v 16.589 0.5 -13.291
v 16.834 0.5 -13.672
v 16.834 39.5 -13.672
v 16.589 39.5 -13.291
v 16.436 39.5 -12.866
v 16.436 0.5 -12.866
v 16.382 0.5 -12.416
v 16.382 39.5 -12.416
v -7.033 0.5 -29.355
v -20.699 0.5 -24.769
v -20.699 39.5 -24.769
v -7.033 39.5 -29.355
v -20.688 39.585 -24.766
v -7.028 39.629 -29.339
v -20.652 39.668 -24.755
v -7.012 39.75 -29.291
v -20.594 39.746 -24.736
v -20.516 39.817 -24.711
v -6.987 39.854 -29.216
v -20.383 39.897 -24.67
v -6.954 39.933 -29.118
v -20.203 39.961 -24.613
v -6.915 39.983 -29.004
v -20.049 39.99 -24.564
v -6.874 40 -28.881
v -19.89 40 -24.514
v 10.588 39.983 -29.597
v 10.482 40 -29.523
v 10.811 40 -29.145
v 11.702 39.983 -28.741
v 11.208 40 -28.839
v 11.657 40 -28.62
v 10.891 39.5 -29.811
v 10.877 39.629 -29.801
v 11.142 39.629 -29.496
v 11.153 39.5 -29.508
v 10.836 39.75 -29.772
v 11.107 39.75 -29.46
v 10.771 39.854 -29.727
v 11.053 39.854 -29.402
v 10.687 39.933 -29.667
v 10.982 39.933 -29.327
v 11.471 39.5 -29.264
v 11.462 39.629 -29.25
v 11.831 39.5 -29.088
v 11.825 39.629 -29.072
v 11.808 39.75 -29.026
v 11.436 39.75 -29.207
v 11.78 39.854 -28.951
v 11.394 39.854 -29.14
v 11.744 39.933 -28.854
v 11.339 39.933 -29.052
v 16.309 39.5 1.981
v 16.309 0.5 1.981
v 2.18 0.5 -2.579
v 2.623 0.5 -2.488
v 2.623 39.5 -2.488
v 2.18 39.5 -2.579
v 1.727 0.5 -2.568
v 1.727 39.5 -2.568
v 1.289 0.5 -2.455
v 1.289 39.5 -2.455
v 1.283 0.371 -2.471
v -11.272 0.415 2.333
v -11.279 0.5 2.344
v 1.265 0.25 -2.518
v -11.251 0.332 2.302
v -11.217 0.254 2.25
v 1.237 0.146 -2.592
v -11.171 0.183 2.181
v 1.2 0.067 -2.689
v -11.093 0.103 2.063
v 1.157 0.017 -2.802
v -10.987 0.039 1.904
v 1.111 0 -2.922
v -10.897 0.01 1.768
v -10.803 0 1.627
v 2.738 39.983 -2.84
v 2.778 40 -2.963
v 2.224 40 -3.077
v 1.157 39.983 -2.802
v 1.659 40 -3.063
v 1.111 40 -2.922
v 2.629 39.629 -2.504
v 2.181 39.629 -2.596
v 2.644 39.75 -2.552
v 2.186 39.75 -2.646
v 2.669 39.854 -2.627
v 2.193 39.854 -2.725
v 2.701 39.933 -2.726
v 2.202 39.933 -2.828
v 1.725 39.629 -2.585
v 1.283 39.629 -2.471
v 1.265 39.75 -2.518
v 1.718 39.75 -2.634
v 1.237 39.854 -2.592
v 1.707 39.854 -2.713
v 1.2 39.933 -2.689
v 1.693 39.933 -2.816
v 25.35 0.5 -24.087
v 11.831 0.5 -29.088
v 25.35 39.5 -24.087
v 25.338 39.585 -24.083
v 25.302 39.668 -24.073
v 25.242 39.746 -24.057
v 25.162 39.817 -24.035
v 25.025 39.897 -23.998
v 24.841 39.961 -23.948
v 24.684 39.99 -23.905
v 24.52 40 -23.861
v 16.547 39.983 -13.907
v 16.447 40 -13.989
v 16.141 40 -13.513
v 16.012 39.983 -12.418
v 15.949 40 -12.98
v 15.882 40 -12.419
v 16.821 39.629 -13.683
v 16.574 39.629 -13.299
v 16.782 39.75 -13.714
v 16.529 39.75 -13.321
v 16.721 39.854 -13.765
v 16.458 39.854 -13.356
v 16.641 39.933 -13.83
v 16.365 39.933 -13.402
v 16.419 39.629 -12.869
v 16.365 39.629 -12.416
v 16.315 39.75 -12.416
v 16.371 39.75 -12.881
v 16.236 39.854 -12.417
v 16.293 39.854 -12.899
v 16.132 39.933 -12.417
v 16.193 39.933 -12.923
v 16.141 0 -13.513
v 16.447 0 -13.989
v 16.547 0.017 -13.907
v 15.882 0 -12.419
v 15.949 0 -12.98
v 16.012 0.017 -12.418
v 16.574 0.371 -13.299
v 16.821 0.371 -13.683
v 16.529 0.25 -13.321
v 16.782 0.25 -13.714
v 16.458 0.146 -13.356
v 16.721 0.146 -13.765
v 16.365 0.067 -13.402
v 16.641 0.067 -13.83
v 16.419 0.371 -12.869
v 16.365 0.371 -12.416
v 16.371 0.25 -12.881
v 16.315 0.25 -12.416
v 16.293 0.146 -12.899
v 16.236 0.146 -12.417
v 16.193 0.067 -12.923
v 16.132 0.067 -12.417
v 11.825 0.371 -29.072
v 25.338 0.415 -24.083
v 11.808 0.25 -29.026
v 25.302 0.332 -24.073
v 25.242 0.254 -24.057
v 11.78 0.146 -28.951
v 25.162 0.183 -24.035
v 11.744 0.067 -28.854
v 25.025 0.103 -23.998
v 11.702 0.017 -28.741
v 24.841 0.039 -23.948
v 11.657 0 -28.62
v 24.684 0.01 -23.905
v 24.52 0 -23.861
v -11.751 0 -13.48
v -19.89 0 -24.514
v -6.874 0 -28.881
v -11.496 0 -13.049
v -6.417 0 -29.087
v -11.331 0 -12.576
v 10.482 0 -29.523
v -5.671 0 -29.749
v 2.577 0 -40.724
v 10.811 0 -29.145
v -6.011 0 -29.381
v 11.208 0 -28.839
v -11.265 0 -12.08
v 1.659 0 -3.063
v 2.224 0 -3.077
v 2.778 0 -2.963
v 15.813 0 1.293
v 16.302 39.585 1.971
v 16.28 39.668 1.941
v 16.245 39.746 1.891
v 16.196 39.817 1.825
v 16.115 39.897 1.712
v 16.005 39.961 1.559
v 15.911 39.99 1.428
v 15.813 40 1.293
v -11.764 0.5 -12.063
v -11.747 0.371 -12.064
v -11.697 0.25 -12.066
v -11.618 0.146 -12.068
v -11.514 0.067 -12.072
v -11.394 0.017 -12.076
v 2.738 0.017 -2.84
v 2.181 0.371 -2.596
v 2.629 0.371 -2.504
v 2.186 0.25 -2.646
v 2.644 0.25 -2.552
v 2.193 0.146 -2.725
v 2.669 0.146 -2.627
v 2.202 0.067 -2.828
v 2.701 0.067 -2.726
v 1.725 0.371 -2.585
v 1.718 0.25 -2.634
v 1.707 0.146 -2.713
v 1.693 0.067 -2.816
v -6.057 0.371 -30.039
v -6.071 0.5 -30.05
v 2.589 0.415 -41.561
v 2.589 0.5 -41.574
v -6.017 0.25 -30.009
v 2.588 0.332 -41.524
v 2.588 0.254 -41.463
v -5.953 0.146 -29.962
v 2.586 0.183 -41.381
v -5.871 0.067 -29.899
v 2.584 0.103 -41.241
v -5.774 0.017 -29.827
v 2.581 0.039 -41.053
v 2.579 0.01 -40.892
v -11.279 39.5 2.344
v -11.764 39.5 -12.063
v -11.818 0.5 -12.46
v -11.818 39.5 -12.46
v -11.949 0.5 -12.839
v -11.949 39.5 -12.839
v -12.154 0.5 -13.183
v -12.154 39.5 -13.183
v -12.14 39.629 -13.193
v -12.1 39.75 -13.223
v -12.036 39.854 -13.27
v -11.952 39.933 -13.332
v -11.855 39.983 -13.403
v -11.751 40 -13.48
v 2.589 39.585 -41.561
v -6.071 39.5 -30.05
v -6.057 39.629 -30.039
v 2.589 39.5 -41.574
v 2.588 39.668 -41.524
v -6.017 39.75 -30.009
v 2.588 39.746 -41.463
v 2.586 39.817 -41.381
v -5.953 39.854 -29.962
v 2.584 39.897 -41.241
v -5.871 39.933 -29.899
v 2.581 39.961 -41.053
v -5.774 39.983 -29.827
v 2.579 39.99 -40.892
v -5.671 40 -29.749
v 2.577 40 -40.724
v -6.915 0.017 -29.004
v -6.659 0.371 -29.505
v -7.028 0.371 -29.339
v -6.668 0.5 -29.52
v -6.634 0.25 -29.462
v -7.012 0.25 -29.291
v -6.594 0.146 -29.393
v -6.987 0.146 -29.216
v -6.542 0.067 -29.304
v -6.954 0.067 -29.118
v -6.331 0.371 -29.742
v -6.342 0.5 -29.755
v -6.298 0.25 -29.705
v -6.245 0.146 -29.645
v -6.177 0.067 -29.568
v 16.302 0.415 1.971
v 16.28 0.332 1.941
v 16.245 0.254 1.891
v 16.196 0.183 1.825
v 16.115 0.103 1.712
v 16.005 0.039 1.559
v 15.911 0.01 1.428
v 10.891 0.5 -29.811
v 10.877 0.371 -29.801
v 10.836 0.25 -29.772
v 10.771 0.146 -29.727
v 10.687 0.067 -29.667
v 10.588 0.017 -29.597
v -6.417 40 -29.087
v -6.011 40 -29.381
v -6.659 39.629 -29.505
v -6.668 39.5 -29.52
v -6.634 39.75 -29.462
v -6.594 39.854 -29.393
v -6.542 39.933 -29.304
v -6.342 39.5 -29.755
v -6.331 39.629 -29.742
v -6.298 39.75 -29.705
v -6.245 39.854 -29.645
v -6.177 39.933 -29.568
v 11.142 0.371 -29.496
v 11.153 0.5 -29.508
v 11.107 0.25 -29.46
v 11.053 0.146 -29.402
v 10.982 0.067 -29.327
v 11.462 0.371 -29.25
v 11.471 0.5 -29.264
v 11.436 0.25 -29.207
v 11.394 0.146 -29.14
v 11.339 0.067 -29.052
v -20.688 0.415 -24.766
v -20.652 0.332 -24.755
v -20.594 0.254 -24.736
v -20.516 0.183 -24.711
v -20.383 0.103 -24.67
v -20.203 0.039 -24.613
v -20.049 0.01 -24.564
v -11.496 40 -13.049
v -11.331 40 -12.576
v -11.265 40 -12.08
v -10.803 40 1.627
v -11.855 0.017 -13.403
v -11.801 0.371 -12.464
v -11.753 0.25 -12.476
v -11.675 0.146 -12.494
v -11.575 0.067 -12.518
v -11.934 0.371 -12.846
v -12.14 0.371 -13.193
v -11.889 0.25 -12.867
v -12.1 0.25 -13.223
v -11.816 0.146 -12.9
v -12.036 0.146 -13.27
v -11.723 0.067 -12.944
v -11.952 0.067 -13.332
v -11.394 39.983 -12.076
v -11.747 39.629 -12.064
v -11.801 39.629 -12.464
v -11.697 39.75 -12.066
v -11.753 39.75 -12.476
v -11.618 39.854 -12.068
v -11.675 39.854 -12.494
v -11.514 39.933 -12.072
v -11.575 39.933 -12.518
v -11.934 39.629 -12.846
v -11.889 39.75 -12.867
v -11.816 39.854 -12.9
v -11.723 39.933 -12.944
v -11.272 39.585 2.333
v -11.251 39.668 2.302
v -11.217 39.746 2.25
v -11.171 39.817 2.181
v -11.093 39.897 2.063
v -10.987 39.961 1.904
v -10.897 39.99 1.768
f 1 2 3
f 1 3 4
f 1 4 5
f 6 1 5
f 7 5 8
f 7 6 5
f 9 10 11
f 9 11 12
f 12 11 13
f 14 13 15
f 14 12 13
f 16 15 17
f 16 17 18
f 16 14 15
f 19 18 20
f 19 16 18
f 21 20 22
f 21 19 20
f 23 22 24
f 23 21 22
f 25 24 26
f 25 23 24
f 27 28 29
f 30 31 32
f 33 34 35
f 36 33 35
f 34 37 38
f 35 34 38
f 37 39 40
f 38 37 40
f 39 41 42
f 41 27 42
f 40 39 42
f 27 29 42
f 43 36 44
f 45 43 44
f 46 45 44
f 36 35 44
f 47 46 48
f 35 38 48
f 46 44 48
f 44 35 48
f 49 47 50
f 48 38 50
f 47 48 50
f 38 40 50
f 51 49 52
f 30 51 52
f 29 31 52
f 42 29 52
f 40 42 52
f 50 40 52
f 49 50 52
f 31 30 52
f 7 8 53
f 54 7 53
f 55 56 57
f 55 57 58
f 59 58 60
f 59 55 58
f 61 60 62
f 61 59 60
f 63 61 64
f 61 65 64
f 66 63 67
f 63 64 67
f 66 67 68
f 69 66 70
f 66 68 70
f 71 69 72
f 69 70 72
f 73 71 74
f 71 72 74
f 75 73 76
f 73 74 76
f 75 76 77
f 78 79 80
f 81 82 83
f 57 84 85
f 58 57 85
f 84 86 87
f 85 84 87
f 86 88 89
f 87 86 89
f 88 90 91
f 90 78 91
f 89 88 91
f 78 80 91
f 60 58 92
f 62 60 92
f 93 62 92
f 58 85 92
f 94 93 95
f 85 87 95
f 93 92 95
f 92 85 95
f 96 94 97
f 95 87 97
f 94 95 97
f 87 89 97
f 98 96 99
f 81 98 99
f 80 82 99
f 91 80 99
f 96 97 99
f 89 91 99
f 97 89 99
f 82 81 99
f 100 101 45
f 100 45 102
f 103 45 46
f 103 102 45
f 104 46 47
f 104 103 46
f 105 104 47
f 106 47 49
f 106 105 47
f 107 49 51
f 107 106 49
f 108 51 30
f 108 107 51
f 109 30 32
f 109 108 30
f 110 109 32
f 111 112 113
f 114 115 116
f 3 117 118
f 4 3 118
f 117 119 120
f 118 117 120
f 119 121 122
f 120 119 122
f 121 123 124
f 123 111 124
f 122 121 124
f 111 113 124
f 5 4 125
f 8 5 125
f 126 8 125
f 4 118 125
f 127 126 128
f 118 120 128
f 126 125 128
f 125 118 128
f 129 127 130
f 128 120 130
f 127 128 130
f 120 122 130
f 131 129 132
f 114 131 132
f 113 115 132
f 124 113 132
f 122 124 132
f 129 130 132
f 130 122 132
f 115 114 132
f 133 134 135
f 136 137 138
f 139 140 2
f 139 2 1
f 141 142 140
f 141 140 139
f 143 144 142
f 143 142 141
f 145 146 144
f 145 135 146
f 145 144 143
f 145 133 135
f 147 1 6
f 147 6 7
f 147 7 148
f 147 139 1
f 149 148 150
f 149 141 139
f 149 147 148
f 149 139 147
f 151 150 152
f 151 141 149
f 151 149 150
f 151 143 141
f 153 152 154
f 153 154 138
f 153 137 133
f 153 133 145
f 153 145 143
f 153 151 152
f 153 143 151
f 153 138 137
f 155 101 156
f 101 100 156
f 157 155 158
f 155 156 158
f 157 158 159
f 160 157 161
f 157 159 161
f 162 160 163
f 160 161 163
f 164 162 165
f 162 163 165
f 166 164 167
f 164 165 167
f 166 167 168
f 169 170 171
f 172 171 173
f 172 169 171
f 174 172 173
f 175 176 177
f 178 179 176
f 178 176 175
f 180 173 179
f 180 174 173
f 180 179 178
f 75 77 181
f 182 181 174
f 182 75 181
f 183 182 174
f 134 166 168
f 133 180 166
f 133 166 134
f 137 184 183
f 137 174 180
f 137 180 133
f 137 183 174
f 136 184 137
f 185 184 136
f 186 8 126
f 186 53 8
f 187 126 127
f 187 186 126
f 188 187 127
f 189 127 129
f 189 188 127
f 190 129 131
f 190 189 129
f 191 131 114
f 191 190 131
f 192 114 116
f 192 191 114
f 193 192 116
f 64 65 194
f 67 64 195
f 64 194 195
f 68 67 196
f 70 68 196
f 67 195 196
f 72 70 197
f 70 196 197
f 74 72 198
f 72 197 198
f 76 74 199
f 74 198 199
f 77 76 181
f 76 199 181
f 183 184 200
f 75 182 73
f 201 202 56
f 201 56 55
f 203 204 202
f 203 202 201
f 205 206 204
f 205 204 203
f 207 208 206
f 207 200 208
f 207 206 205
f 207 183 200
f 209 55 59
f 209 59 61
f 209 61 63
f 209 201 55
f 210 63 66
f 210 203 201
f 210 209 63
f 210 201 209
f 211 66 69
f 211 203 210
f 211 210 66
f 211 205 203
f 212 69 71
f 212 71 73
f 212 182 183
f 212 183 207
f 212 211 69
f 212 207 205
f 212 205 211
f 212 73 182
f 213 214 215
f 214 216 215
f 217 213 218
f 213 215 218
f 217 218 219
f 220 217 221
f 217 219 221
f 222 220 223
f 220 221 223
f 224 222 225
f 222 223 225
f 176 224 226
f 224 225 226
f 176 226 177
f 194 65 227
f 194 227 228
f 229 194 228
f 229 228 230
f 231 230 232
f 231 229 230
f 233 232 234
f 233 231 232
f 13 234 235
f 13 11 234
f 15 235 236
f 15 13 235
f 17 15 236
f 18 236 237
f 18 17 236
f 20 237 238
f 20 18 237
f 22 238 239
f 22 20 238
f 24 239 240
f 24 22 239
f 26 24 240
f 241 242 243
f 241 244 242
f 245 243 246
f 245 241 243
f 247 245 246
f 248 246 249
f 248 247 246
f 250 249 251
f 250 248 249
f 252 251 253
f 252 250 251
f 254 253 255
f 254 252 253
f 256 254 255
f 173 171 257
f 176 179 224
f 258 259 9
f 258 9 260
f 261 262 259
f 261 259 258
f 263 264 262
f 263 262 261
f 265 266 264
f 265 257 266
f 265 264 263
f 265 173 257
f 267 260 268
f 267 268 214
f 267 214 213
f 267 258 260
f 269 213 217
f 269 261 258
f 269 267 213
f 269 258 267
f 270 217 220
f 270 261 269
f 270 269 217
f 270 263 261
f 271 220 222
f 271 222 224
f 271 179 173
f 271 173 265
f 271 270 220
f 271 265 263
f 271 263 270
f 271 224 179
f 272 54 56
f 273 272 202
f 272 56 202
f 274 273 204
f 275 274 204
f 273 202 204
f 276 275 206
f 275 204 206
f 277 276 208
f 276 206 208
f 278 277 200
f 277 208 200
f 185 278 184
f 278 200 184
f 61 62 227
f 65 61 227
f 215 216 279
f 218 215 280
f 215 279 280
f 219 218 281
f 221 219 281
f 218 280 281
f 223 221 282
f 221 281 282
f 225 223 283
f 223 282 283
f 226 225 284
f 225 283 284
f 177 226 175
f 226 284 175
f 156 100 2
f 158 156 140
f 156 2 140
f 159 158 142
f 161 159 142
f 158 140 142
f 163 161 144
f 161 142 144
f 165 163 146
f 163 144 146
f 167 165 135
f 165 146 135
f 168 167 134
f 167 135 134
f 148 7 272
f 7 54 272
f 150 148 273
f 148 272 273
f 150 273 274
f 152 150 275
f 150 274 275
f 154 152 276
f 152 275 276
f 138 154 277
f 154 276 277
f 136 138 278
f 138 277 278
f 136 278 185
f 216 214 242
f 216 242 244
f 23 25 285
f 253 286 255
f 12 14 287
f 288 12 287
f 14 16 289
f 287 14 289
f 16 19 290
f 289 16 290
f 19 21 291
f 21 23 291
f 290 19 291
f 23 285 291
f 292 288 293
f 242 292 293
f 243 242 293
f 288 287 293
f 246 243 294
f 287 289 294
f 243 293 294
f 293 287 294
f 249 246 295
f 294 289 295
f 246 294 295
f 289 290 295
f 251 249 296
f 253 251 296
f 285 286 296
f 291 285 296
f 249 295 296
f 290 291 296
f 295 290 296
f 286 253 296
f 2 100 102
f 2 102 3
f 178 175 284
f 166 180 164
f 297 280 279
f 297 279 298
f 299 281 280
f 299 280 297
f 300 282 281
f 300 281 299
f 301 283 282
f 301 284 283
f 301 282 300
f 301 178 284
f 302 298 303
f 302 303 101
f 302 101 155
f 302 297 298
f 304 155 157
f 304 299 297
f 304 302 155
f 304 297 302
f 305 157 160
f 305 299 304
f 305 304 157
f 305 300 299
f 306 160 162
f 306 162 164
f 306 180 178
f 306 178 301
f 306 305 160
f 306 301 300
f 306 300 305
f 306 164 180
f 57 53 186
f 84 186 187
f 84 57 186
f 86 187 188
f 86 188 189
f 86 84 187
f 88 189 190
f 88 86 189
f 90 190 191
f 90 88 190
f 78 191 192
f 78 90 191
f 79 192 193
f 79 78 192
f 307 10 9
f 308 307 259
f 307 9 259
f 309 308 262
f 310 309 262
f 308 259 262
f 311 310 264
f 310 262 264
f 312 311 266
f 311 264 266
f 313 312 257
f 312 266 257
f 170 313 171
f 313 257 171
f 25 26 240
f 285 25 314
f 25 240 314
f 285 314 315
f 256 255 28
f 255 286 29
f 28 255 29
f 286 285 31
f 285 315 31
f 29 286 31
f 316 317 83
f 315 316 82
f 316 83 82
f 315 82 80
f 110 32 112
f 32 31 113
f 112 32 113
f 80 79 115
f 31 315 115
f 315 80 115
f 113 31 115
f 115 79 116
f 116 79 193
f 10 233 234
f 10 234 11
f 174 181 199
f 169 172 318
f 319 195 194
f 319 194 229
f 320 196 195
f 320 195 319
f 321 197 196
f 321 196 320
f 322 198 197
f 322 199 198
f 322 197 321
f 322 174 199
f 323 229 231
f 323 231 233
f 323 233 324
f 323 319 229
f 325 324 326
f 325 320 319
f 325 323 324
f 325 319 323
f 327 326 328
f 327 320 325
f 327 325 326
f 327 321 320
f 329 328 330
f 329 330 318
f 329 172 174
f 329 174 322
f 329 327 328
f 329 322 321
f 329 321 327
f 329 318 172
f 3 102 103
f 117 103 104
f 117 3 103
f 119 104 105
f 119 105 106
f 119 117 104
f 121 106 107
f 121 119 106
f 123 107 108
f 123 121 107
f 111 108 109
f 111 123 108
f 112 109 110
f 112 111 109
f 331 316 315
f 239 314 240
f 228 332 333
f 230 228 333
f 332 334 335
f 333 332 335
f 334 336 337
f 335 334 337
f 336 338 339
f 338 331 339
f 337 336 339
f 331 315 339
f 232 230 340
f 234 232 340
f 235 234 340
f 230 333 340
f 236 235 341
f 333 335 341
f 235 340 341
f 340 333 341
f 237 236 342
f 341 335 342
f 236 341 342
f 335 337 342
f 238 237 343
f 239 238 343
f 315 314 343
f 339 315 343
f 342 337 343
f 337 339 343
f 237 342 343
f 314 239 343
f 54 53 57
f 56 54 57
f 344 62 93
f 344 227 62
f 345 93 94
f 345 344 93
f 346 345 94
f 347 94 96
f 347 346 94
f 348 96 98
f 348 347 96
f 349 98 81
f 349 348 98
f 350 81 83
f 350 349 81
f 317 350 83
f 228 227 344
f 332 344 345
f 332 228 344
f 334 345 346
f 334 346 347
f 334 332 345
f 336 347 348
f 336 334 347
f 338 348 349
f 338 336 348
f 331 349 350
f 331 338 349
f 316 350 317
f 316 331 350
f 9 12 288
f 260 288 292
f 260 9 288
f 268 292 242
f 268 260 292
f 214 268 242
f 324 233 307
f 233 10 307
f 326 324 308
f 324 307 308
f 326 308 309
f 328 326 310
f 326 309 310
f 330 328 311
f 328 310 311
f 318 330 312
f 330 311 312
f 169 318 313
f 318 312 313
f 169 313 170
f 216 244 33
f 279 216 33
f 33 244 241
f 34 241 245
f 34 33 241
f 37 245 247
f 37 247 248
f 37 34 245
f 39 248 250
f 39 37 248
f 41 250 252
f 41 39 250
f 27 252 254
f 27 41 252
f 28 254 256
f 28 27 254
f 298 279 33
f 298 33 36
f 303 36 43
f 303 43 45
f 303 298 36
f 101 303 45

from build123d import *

# Parameters (mm, degrees)
BOSS_EXTRUDE1_DEPTH = 40
FILLET1_R           = 0.5


with BuildPart() as part:
    # Sketch1 → Boss-Extrude1 (new body)
    with BuildSketch(Plane(origin=(0, 0, 0), x_dir=(-1, 0, 0), z_dir=(0, 1, 0))):
        with BuildLine():
            Line((-16.382358243, -12.416132382), (-16.309116245, 1.980717277))
            Line((-16.309116245, 1.980717277), (-2.623220974, -2.488165706))
            ThreePointArc((-2.623220974, -2.488165706), (-1.953288331, -2.586352132), (-1.288986221, -2.455382561))
            Line((-1.288986221, -2.455382561), (11.279166812, 2.343564434))
            Line((11.279166812, 2.343564434), (11.764255017, -12.063312843))
            ThreePointArc((11.764255017, -12.063312843), (11.874027832, -12.652761031), (12.15358265, -13.183183826))
            Line((12.15358265, -13.183183826), (20.699476347, -24.769483728))
            Line((20.699476347, -24.769483728), (7.033191834, -29.354905309))
            ThreePointArc((7.033191834, -29.354905309), (6.499122182, -29.629147424), (6.070505236, -30.049536105))
            Line((6.070505236, -30.049536105), (-2.58921338, -41.573541353))
            Line((-2.58921338, -41.573541353), (-10.890805488, -29.810964554))
            ThreePointArc((-10.890805488, -29.810964554), (-11.306058502, -29.378455396), (-11.830848647, -29.088464807))
            Line((-11.830848647, -29.088464807), (-25.350255054, -24.086557786))
            Line((-25.350255054, -24.086557786), (-16.834067363, -13.67200498))
            ThreePointArc((-16.834067363, -13.67200498), (-16.500364189, -13.082859401), (-16.382358243, -12.416132382))
        make_face()
    extrude(amount=BOSS_EXTRUDE1_DEPTH)

    # Fillet1
    fillet1_edges = [part.edges().sort_by_distance(p)[0] for p in [
        (18.59055185, 40, -26.587511297),
        (16.345737244, 0, -5.217707553),
        (9.46616861, 0, -0.253724215),
        (1.953288331, 0, -2.586352132),
        (-4.995090296, 0, -0.055909063),
        (-11.521710915, 0, -4.859874204),
        (-11.874027832, 0, -12.652761031),
        (11.306058502, 40, -29.378455396),
        (-16.426529498, 0, -18.976333777),
        (-13.86633409, 0, -27.062194519),
        (-6.499122182, 0, -29.629147424),
        (-1.740645928, 0, -35.811538729),
        (6.740009434, 0, -35.692252953),
        (11.306058502, 0, -29.378455396),
        (18.59055185, 0, -26.587511297),
        (21.092161209, 0, -18.879281383),
        (16.500364189, 0, -13.082859401),
        (6.740009434, 40, -35.692252953),
        (-1.740645928, 40, -35.811538729),
        (-6.499122182, 40, -29.629147424),
        (-13.86633409, 40, -27.062194519),
        (-16.426529498, 40, -18.976333777),
        (-11.874027832, 40, -12.652761031),
        (-11.521710915, 40, -4.859874204),
        (-4.995090296, 40, -0.055909063),
        (16.500364189, 40, -13.082859401),
        (1.953288331, 40, -2.586352132),
        (9.46616861, 40, -0.253724215),
        (16.345737244, 40, -5.217707553),
        (21.092161209, 40, -18.879281383),
    ]]
    fillet(fillet1_edges, radius=FILLET1_R)


solid = part.part
